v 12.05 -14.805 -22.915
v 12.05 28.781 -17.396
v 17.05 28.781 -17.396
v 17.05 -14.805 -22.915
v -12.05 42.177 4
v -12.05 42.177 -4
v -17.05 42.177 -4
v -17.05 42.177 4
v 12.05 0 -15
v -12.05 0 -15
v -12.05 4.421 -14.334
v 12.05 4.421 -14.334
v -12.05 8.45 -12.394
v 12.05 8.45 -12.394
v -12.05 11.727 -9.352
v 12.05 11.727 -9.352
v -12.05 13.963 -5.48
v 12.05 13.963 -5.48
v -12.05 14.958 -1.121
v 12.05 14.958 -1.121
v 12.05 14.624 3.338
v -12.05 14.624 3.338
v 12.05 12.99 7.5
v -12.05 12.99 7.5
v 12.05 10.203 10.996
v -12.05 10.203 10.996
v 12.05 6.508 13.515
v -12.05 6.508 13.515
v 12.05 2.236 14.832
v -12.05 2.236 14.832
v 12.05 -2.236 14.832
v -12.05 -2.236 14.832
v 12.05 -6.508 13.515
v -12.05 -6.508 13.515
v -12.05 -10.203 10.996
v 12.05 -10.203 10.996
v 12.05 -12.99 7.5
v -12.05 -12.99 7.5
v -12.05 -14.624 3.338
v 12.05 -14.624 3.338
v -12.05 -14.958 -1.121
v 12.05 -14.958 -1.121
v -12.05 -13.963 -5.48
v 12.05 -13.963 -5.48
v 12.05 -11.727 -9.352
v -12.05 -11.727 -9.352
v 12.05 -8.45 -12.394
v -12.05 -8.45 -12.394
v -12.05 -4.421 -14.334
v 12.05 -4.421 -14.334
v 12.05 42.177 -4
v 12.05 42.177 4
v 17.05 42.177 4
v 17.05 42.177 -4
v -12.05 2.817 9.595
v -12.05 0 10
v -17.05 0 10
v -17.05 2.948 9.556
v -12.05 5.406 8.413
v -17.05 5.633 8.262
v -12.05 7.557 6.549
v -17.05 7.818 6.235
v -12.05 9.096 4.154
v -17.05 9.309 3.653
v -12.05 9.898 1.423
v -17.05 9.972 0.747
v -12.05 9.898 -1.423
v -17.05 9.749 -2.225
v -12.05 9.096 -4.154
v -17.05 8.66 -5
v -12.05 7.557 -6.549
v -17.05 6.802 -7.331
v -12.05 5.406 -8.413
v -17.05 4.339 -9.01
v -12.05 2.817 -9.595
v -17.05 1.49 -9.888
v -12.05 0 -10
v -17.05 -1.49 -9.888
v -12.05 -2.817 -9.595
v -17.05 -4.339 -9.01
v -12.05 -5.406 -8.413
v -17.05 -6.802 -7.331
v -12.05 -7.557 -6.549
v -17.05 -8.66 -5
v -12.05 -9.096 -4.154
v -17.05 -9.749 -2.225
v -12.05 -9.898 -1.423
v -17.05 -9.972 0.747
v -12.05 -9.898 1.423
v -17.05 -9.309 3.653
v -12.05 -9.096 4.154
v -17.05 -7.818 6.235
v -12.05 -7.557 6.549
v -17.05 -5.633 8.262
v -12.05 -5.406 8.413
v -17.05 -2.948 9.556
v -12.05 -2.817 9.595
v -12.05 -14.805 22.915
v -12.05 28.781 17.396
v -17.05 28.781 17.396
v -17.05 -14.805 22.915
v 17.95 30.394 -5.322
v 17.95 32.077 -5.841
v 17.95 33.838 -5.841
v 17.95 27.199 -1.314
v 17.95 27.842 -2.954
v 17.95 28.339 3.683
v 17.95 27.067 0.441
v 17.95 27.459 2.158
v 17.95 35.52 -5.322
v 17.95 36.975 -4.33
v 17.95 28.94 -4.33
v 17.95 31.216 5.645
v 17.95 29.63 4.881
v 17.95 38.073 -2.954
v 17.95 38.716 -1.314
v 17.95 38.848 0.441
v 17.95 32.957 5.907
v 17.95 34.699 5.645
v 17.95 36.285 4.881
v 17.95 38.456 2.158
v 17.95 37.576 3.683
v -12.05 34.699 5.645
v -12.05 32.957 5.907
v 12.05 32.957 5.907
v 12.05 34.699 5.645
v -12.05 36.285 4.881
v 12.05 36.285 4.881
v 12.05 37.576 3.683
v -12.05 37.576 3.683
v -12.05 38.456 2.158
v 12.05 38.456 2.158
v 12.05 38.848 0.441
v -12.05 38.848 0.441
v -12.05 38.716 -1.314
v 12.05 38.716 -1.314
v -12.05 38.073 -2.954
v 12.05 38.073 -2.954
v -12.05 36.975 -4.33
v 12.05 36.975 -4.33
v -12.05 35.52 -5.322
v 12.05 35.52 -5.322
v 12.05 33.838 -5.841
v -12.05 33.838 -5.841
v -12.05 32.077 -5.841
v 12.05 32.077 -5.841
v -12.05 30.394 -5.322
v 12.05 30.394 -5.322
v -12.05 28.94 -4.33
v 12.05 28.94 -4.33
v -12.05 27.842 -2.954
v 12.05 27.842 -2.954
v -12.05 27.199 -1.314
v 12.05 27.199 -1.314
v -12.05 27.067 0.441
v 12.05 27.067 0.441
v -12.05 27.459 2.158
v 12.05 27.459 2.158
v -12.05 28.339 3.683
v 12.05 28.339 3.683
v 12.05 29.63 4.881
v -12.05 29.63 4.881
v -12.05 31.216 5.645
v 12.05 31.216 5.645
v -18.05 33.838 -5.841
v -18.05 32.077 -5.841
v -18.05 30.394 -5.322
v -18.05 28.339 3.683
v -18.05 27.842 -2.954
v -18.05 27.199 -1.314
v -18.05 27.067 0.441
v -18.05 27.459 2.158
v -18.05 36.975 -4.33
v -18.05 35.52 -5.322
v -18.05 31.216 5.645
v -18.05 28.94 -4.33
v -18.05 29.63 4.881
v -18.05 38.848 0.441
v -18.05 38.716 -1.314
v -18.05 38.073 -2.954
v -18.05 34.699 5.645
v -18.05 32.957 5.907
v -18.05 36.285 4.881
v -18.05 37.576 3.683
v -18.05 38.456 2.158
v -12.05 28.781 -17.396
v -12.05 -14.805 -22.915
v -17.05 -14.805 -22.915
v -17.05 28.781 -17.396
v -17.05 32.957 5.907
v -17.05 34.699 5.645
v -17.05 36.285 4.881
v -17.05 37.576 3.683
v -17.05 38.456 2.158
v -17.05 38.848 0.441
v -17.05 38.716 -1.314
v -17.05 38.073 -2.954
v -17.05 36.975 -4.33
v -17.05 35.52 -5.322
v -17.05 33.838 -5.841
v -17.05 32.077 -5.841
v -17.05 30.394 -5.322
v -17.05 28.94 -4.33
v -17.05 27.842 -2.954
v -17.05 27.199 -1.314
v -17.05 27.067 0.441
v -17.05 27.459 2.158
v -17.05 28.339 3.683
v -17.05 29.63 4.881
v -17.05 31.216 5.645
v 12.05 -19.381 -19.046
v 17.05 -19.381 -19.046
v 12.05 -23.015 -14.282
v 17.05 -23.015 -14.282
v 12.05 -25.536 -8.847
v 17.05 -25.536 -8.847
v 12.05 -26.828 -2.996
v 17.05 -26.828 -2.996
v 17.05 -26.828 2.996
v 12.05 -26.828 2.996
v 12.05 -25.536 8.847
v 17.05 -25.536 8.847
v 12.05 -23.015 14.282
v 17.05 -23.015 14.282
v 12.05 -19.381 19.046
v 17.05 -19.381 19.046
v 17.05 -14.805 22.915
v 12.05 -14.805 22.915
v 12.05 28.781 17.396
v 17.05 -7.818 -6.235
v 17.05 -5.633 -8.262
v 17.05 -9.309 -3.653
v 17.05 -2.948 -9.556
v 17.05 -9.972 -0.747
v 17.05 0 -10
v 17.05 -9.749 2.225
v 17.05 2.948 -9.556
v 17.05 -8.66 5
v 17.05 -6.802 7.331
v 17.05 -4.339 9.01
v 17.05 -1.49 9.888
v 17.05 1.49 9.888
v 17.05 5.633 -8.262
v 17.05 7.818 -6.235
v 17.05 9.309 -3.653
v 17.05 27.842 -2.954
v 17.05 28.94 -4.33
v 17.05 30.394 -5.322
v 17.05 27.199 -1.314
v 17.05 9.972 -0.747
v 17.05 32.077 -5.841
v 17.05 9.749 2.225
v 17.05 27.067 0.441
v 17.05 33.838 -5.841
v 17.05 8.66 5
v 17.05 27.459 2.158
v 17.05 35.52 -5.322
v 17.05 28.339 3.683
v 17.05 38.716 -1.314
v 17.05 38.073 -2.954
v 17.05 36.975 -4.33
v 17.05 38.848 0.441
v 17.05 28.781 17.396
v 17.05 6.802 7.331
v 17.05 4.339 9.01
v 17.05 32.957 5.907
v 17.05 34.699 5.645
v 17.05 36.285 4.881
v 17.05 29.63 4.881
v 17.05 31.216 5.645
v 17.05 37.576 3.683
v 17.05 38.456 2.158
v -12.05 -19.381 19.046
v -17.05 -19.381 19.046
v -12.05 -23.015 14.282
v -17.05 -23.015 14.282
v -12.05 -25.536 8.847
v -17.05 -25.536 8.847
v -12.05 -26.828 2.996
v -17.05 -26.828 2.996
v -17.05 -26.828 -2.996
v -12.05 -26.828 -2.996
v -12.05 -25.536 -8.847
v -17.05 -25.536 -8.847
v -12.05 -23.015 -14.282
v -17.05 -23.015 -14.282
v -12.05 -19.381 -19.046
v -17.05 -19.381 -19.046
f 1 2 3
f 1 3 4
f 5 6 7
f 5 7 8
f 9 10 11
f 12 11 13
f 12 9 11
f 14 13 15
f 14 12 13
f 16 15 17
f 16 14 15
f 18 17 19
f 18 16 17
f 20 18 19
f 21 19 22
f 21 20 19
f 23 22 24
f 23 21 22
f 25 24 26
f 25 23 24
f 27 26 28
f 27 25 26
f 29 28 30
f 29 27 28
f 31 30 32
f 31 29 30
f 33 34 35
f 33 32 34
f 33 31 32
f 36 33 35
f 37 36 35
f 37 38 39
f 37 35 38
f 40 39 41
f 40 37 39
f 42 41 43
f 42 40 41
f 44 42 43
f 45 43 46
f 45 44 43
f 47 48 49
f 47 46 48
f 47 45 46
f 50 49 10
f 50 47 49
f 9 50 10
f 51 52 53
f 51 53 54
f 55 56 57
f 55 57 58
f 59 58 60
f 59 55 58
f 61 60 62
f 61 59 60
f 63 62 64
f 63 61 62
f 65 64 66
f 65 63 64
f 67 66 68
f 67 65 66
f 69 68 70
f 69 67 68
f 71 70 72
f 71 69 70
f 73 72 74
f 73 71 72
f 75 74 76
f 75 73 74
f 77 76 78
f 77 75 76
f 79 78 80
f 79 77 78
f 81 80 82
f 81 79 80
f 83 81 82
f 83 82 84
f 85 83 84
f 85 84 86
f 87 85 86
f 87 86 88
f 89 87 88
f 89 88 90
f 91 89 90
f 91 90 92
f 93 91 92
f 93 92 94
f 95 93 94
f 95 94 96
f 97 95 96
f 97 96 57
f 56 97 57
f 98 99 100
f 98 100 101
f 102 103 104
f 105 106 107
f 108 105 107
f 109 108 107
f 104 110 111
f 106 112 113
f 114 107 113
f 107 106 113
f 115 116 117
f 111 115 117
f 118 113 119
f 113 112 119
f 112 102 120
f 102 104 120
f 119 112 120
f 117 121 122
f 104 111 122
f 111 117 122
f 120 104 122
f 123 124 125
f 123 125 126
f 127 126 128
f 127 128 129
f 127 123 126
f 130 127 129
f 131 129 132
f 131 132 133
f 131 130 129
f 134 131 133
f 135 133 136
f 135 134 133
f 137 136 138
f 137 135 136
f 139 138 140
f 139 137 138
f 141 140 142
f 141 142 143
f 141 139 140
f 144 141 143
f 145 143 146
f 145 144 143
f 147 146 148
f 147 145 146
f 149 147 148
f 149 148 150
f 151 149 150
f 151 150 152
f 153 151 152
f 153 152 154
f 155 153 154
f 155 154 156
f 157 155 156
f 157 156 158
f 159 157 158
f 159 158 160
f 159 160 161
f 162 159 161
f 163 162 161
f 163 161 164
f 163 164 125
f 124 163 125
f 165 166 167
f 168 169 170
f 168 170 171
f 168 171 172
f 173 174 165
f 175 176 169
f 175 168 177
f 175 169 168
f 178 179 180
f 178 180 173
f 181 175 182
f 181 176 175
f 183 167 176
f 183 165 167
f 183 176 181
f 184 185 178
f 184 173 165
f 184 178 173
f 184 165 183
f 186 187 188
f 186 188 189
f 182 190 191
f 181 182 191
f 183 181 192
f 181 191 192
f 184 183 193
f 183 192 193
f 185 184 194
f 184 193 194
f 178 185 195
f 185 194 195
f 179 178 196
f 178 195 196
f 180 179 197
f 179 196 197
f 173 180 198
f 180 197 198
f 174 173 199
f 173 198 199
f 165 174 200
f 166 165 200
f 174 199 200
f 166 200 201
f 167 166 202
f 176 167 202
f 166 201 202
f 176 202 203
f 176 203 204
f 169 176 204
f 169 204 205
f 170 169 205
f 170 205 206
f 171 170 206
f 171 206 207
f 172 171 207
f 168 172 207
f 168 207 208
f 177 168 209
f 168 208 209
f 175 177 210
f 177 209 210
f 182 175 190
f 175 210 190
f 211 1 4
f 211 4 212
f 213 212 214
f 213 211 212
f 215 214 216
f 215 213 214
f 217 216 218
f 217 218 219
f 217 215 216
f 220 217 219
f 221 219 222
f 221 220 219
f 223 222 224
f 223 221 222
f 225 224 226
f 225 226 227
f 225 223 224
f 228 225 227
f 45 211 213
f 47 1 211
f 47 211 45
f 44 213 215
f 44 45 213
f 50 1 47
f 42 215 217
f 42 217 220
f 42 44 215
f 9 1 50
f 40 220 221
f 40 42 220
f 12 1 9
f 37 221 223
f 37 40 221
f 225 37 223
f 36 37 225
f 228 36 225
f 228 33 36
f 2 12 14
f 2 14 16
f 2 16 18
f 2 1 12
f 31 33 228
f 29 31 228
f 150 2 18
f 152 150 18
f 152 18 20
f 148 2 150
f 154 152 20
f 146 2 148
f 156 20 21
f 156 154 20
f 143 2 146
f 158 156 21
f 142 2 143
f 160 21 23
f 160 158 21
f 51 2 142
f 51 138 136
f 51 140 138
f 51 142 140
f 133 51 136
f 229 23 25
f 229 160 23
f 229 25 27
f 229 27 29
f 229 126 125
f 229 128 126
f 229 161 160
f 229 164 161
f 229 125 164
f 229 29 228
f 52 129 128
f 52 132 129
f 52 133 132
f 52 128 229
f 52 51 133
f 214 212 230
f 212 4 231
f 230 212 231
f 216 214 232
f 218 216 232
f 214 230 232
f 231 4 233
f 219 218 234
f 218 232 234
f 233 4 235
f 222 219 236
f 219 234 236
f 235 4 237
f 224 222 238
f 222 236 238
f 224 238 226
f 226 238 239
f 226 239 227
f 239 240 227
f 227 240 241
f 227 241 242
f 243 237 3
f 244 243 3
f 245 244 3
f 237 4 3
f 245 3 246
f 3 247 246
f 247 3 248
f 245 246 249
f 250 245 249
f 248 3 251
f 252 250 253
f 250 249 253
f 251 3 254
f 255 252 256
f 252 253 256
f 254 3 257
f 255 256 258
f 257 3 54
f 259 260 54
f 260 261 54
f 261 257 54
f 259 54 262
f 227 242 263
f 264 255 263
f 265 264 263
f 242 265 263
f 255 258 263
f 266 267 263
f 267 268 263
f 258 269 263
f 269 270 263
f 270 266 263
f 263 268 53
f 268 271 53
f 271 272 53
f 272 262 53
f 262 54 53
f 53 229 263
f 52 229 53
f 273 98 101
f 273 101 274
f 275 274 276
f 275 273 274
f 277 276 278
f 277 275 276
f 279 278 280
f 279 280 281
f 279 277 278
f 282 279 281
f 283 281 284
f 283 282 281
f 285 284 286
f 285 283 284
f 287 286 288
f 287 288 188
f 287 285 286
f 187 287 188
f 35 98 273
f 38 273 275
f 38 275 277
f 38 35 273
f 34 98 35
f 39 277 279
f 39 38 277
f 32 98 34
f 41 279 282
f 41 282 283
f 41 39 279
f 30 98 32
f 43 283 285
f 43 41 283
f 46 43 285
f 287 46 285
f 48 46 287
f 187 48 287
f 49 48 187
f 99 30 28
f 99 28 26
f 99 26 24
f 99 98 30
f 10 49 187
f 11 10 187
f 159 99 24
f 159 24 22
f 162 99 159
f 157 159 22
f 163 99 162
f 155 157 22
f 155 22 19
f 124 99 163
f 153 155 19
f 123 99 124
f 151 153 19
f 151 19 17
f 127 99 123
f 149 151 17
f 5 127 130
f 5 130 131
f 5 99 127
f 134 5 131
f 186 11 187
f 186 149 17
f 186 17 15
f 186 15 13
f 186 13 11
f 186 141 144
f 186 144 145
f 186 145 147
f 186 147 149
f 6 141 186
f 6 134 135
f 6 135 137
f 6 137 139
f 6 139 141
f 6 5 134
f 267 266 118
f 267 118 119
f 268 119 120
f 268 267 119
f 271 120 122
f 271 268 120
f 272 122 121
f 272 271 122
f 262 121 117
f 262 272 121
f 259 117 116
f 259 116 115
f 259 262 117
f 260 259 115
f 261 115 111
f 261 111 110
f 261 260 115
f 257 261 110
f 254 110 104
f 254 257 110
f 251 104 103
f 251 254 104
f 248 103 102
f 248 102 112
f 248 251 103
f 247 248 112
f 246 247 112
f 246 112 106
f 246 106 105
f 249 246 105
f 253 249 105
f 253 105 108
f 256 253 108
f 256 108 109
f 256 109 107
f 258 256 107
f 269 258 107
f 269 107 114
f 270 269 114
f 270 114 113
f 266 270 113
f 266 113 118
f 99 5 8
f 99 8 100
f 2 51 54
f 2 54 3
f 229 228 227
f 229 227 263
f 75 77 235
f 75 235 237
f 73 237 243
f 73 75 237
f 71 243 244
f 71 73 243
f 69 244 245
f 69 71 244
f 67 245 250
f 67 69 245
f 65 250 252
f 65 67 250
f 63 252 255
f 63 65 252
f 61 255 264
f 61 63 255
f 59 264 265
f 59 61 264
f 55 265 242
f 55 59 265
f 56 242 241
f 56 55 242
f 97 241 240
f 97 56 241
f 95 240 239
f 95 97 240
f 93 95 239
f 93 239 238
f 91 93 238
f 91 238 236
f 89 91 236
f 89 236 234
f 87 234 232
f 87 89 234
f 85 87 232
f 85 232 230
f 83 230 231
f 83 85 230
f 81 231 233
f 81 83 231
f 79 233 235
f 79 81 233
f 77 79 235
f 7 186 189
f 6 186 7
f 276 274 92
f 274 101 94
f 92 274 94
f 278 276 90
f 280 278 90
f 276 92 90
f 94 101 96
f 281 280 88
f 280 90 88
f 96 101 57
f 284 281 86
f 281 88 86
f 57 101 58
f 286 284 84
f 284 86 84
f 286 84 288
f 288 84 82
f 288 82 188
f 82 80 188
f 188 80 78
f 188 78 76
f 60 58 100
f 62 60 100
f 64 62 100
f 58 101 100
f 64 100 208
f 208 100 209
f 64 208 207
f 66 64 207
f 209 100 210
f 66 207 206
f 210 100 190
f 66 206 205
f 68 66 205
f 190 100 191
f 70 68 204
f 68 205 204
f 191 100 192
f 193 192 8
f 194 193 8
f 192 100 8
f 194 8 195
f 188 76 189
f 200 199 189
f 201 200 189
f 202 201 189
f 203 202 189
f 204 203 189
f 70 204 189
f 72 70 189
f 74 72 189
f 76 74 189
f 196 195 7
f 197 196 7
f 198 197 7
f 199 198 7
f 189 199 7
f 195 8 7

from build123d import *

# Parameters (mm, degrees)
IZIM2_R                          = 15
IZIM2_R_2                        = 10
Y_KSEKLIK_EKSTR_ZYON1_DEPTH      = 12.05
IZIM3_R                          = 10
Y_KSEKLIK_EKSTR_ZYON2_DEPTH      = 5
IZIM4_R                          = 15
Y_KSEKLIK_EKSTR_ZYON3_DEPTH      = 5
IZIM7_R                          = 15
IZIM7_R_2                        = 10
Y_KSEKLIK_EKSTR_ZYON4_DEPTH      = 5
IZIM5_R                          = 5.907014981
Y_KSEKLIK_EKSTR_ZYON5_DEPTH      = 1
Y_KSEKLIK_EKSTR_ZYON5_DEPTH_BACK = 35


with BuildPart() as part:
    # Çizim2 → Yükseklik-Ekstrüzyon1 (new body, symmetric)
    with BuildSketch(Plane(origin=(0, 0, 0), x_dir=(0, 0, -1), z_dir=(1, 0, 0))):
        Circle(IZIM2_R)
        Circle(IZIM2_R_2, mode=Mode.SUBTRACT)
    extrude(amount=Y_KSEKLIK_EKSTR_ZYON1_DEPTH, both=True)

    # Çizim3 → Yükseklik-Ekstrüzyon2 (add)
    with BuildSketch(Plane(origin=(12.05, 0, 0), x_dir=(0, 0, -1), z_dir=(1, 0, 0))):
        with BuildLine():
            Line((-4, 42.176870951), (4, 42.176870951))
            Line((4, 42.176870951), (17.395555059, 28.781315891))
            Line((17.395555059, 28.781315891), (22.914530919, -14.80525669))
            ThreePointArc((22.914530919, -14.80525669), (0, -26.990652818), (-22.914530919, -14.80525669))
            Line((-22.914530919, -14.80525669), (-17.395555059, 28.781315891))
            Line((-17.395555059, 28.781315891), (-4, 42.176870951))
        make_face()
        Circle(IZIM3_R, mode=Mode.SUBTRACT)
    extrude(amount=Y_KSEKLIK_EKSTR_ZYON2_DEPTH)



with BuildPart() as body_2:
    # Çizim4 → Yükseklik-Ekstrüzyon3 (new body)
    with BuildSketch(Plane.ZY.offset(12.05)):
        with BuildLine():
            Line((-4, 42.176870951), (4, 42.176870951))
            Line((4, 42.176870951), (17.395555059, 28.781315891))
            Line((17.395555059, 28.781315891), (22.914530919, -14.80525669))
            ThreePointArc((22.914530919, -14.80525669), (0, -26.990652818), (-22.914530919, -14.80525669))
            Line((-22.914530919, -14.80525669), (-17.395555059, 28.781315891))
            Line((-17.395555059, 28.781315891), (-4, 42.176870951))
        make_face()
        Circle(IZIM4_R, mode=Mode.SUBTRACT)
    extrude(amount=Y_KSEKLIK_EKSTR_ZYON3_DEPTH)


with BuildPart() as part_1:
    add(part.part)

    add(body_2.part)  # Yükseklik-Ekstrüzyon4 merges body 2
    # Çizim7 → Yükseklik-Ekstrüzyon4 (add)
    with BuildSketch(Plane.ZY.offset(12.05)):
        Circle(IZIM7_R)
        Circle(IZIM7_R_2, mode=Mode.SUBTRACT)
    extrude(amount=Y_KSEKLIK_EKSTR_ZYON4_DEPTH)

    # Çizim5 → Yükseklik-Ekstrüzyon5 (add, two sides)
    with BuildSketch(Plane.ZY.offset(17.05)) as y_kseklik_ekstr_zyon5_sk:
        with Locations((0, 32.957419359)):
            Circle(IZIM5_R)
    extrude(amount=Y_KSEKLIK_EKSTR_ZYON5_DEPTH)
    extrude(y_kseklik_ekstr_zyon5_sk.sketch, amount=-Y_KSEKLIK_EKSTR_ZYON5_DEPTH_BACK)


solid = part_1.part
